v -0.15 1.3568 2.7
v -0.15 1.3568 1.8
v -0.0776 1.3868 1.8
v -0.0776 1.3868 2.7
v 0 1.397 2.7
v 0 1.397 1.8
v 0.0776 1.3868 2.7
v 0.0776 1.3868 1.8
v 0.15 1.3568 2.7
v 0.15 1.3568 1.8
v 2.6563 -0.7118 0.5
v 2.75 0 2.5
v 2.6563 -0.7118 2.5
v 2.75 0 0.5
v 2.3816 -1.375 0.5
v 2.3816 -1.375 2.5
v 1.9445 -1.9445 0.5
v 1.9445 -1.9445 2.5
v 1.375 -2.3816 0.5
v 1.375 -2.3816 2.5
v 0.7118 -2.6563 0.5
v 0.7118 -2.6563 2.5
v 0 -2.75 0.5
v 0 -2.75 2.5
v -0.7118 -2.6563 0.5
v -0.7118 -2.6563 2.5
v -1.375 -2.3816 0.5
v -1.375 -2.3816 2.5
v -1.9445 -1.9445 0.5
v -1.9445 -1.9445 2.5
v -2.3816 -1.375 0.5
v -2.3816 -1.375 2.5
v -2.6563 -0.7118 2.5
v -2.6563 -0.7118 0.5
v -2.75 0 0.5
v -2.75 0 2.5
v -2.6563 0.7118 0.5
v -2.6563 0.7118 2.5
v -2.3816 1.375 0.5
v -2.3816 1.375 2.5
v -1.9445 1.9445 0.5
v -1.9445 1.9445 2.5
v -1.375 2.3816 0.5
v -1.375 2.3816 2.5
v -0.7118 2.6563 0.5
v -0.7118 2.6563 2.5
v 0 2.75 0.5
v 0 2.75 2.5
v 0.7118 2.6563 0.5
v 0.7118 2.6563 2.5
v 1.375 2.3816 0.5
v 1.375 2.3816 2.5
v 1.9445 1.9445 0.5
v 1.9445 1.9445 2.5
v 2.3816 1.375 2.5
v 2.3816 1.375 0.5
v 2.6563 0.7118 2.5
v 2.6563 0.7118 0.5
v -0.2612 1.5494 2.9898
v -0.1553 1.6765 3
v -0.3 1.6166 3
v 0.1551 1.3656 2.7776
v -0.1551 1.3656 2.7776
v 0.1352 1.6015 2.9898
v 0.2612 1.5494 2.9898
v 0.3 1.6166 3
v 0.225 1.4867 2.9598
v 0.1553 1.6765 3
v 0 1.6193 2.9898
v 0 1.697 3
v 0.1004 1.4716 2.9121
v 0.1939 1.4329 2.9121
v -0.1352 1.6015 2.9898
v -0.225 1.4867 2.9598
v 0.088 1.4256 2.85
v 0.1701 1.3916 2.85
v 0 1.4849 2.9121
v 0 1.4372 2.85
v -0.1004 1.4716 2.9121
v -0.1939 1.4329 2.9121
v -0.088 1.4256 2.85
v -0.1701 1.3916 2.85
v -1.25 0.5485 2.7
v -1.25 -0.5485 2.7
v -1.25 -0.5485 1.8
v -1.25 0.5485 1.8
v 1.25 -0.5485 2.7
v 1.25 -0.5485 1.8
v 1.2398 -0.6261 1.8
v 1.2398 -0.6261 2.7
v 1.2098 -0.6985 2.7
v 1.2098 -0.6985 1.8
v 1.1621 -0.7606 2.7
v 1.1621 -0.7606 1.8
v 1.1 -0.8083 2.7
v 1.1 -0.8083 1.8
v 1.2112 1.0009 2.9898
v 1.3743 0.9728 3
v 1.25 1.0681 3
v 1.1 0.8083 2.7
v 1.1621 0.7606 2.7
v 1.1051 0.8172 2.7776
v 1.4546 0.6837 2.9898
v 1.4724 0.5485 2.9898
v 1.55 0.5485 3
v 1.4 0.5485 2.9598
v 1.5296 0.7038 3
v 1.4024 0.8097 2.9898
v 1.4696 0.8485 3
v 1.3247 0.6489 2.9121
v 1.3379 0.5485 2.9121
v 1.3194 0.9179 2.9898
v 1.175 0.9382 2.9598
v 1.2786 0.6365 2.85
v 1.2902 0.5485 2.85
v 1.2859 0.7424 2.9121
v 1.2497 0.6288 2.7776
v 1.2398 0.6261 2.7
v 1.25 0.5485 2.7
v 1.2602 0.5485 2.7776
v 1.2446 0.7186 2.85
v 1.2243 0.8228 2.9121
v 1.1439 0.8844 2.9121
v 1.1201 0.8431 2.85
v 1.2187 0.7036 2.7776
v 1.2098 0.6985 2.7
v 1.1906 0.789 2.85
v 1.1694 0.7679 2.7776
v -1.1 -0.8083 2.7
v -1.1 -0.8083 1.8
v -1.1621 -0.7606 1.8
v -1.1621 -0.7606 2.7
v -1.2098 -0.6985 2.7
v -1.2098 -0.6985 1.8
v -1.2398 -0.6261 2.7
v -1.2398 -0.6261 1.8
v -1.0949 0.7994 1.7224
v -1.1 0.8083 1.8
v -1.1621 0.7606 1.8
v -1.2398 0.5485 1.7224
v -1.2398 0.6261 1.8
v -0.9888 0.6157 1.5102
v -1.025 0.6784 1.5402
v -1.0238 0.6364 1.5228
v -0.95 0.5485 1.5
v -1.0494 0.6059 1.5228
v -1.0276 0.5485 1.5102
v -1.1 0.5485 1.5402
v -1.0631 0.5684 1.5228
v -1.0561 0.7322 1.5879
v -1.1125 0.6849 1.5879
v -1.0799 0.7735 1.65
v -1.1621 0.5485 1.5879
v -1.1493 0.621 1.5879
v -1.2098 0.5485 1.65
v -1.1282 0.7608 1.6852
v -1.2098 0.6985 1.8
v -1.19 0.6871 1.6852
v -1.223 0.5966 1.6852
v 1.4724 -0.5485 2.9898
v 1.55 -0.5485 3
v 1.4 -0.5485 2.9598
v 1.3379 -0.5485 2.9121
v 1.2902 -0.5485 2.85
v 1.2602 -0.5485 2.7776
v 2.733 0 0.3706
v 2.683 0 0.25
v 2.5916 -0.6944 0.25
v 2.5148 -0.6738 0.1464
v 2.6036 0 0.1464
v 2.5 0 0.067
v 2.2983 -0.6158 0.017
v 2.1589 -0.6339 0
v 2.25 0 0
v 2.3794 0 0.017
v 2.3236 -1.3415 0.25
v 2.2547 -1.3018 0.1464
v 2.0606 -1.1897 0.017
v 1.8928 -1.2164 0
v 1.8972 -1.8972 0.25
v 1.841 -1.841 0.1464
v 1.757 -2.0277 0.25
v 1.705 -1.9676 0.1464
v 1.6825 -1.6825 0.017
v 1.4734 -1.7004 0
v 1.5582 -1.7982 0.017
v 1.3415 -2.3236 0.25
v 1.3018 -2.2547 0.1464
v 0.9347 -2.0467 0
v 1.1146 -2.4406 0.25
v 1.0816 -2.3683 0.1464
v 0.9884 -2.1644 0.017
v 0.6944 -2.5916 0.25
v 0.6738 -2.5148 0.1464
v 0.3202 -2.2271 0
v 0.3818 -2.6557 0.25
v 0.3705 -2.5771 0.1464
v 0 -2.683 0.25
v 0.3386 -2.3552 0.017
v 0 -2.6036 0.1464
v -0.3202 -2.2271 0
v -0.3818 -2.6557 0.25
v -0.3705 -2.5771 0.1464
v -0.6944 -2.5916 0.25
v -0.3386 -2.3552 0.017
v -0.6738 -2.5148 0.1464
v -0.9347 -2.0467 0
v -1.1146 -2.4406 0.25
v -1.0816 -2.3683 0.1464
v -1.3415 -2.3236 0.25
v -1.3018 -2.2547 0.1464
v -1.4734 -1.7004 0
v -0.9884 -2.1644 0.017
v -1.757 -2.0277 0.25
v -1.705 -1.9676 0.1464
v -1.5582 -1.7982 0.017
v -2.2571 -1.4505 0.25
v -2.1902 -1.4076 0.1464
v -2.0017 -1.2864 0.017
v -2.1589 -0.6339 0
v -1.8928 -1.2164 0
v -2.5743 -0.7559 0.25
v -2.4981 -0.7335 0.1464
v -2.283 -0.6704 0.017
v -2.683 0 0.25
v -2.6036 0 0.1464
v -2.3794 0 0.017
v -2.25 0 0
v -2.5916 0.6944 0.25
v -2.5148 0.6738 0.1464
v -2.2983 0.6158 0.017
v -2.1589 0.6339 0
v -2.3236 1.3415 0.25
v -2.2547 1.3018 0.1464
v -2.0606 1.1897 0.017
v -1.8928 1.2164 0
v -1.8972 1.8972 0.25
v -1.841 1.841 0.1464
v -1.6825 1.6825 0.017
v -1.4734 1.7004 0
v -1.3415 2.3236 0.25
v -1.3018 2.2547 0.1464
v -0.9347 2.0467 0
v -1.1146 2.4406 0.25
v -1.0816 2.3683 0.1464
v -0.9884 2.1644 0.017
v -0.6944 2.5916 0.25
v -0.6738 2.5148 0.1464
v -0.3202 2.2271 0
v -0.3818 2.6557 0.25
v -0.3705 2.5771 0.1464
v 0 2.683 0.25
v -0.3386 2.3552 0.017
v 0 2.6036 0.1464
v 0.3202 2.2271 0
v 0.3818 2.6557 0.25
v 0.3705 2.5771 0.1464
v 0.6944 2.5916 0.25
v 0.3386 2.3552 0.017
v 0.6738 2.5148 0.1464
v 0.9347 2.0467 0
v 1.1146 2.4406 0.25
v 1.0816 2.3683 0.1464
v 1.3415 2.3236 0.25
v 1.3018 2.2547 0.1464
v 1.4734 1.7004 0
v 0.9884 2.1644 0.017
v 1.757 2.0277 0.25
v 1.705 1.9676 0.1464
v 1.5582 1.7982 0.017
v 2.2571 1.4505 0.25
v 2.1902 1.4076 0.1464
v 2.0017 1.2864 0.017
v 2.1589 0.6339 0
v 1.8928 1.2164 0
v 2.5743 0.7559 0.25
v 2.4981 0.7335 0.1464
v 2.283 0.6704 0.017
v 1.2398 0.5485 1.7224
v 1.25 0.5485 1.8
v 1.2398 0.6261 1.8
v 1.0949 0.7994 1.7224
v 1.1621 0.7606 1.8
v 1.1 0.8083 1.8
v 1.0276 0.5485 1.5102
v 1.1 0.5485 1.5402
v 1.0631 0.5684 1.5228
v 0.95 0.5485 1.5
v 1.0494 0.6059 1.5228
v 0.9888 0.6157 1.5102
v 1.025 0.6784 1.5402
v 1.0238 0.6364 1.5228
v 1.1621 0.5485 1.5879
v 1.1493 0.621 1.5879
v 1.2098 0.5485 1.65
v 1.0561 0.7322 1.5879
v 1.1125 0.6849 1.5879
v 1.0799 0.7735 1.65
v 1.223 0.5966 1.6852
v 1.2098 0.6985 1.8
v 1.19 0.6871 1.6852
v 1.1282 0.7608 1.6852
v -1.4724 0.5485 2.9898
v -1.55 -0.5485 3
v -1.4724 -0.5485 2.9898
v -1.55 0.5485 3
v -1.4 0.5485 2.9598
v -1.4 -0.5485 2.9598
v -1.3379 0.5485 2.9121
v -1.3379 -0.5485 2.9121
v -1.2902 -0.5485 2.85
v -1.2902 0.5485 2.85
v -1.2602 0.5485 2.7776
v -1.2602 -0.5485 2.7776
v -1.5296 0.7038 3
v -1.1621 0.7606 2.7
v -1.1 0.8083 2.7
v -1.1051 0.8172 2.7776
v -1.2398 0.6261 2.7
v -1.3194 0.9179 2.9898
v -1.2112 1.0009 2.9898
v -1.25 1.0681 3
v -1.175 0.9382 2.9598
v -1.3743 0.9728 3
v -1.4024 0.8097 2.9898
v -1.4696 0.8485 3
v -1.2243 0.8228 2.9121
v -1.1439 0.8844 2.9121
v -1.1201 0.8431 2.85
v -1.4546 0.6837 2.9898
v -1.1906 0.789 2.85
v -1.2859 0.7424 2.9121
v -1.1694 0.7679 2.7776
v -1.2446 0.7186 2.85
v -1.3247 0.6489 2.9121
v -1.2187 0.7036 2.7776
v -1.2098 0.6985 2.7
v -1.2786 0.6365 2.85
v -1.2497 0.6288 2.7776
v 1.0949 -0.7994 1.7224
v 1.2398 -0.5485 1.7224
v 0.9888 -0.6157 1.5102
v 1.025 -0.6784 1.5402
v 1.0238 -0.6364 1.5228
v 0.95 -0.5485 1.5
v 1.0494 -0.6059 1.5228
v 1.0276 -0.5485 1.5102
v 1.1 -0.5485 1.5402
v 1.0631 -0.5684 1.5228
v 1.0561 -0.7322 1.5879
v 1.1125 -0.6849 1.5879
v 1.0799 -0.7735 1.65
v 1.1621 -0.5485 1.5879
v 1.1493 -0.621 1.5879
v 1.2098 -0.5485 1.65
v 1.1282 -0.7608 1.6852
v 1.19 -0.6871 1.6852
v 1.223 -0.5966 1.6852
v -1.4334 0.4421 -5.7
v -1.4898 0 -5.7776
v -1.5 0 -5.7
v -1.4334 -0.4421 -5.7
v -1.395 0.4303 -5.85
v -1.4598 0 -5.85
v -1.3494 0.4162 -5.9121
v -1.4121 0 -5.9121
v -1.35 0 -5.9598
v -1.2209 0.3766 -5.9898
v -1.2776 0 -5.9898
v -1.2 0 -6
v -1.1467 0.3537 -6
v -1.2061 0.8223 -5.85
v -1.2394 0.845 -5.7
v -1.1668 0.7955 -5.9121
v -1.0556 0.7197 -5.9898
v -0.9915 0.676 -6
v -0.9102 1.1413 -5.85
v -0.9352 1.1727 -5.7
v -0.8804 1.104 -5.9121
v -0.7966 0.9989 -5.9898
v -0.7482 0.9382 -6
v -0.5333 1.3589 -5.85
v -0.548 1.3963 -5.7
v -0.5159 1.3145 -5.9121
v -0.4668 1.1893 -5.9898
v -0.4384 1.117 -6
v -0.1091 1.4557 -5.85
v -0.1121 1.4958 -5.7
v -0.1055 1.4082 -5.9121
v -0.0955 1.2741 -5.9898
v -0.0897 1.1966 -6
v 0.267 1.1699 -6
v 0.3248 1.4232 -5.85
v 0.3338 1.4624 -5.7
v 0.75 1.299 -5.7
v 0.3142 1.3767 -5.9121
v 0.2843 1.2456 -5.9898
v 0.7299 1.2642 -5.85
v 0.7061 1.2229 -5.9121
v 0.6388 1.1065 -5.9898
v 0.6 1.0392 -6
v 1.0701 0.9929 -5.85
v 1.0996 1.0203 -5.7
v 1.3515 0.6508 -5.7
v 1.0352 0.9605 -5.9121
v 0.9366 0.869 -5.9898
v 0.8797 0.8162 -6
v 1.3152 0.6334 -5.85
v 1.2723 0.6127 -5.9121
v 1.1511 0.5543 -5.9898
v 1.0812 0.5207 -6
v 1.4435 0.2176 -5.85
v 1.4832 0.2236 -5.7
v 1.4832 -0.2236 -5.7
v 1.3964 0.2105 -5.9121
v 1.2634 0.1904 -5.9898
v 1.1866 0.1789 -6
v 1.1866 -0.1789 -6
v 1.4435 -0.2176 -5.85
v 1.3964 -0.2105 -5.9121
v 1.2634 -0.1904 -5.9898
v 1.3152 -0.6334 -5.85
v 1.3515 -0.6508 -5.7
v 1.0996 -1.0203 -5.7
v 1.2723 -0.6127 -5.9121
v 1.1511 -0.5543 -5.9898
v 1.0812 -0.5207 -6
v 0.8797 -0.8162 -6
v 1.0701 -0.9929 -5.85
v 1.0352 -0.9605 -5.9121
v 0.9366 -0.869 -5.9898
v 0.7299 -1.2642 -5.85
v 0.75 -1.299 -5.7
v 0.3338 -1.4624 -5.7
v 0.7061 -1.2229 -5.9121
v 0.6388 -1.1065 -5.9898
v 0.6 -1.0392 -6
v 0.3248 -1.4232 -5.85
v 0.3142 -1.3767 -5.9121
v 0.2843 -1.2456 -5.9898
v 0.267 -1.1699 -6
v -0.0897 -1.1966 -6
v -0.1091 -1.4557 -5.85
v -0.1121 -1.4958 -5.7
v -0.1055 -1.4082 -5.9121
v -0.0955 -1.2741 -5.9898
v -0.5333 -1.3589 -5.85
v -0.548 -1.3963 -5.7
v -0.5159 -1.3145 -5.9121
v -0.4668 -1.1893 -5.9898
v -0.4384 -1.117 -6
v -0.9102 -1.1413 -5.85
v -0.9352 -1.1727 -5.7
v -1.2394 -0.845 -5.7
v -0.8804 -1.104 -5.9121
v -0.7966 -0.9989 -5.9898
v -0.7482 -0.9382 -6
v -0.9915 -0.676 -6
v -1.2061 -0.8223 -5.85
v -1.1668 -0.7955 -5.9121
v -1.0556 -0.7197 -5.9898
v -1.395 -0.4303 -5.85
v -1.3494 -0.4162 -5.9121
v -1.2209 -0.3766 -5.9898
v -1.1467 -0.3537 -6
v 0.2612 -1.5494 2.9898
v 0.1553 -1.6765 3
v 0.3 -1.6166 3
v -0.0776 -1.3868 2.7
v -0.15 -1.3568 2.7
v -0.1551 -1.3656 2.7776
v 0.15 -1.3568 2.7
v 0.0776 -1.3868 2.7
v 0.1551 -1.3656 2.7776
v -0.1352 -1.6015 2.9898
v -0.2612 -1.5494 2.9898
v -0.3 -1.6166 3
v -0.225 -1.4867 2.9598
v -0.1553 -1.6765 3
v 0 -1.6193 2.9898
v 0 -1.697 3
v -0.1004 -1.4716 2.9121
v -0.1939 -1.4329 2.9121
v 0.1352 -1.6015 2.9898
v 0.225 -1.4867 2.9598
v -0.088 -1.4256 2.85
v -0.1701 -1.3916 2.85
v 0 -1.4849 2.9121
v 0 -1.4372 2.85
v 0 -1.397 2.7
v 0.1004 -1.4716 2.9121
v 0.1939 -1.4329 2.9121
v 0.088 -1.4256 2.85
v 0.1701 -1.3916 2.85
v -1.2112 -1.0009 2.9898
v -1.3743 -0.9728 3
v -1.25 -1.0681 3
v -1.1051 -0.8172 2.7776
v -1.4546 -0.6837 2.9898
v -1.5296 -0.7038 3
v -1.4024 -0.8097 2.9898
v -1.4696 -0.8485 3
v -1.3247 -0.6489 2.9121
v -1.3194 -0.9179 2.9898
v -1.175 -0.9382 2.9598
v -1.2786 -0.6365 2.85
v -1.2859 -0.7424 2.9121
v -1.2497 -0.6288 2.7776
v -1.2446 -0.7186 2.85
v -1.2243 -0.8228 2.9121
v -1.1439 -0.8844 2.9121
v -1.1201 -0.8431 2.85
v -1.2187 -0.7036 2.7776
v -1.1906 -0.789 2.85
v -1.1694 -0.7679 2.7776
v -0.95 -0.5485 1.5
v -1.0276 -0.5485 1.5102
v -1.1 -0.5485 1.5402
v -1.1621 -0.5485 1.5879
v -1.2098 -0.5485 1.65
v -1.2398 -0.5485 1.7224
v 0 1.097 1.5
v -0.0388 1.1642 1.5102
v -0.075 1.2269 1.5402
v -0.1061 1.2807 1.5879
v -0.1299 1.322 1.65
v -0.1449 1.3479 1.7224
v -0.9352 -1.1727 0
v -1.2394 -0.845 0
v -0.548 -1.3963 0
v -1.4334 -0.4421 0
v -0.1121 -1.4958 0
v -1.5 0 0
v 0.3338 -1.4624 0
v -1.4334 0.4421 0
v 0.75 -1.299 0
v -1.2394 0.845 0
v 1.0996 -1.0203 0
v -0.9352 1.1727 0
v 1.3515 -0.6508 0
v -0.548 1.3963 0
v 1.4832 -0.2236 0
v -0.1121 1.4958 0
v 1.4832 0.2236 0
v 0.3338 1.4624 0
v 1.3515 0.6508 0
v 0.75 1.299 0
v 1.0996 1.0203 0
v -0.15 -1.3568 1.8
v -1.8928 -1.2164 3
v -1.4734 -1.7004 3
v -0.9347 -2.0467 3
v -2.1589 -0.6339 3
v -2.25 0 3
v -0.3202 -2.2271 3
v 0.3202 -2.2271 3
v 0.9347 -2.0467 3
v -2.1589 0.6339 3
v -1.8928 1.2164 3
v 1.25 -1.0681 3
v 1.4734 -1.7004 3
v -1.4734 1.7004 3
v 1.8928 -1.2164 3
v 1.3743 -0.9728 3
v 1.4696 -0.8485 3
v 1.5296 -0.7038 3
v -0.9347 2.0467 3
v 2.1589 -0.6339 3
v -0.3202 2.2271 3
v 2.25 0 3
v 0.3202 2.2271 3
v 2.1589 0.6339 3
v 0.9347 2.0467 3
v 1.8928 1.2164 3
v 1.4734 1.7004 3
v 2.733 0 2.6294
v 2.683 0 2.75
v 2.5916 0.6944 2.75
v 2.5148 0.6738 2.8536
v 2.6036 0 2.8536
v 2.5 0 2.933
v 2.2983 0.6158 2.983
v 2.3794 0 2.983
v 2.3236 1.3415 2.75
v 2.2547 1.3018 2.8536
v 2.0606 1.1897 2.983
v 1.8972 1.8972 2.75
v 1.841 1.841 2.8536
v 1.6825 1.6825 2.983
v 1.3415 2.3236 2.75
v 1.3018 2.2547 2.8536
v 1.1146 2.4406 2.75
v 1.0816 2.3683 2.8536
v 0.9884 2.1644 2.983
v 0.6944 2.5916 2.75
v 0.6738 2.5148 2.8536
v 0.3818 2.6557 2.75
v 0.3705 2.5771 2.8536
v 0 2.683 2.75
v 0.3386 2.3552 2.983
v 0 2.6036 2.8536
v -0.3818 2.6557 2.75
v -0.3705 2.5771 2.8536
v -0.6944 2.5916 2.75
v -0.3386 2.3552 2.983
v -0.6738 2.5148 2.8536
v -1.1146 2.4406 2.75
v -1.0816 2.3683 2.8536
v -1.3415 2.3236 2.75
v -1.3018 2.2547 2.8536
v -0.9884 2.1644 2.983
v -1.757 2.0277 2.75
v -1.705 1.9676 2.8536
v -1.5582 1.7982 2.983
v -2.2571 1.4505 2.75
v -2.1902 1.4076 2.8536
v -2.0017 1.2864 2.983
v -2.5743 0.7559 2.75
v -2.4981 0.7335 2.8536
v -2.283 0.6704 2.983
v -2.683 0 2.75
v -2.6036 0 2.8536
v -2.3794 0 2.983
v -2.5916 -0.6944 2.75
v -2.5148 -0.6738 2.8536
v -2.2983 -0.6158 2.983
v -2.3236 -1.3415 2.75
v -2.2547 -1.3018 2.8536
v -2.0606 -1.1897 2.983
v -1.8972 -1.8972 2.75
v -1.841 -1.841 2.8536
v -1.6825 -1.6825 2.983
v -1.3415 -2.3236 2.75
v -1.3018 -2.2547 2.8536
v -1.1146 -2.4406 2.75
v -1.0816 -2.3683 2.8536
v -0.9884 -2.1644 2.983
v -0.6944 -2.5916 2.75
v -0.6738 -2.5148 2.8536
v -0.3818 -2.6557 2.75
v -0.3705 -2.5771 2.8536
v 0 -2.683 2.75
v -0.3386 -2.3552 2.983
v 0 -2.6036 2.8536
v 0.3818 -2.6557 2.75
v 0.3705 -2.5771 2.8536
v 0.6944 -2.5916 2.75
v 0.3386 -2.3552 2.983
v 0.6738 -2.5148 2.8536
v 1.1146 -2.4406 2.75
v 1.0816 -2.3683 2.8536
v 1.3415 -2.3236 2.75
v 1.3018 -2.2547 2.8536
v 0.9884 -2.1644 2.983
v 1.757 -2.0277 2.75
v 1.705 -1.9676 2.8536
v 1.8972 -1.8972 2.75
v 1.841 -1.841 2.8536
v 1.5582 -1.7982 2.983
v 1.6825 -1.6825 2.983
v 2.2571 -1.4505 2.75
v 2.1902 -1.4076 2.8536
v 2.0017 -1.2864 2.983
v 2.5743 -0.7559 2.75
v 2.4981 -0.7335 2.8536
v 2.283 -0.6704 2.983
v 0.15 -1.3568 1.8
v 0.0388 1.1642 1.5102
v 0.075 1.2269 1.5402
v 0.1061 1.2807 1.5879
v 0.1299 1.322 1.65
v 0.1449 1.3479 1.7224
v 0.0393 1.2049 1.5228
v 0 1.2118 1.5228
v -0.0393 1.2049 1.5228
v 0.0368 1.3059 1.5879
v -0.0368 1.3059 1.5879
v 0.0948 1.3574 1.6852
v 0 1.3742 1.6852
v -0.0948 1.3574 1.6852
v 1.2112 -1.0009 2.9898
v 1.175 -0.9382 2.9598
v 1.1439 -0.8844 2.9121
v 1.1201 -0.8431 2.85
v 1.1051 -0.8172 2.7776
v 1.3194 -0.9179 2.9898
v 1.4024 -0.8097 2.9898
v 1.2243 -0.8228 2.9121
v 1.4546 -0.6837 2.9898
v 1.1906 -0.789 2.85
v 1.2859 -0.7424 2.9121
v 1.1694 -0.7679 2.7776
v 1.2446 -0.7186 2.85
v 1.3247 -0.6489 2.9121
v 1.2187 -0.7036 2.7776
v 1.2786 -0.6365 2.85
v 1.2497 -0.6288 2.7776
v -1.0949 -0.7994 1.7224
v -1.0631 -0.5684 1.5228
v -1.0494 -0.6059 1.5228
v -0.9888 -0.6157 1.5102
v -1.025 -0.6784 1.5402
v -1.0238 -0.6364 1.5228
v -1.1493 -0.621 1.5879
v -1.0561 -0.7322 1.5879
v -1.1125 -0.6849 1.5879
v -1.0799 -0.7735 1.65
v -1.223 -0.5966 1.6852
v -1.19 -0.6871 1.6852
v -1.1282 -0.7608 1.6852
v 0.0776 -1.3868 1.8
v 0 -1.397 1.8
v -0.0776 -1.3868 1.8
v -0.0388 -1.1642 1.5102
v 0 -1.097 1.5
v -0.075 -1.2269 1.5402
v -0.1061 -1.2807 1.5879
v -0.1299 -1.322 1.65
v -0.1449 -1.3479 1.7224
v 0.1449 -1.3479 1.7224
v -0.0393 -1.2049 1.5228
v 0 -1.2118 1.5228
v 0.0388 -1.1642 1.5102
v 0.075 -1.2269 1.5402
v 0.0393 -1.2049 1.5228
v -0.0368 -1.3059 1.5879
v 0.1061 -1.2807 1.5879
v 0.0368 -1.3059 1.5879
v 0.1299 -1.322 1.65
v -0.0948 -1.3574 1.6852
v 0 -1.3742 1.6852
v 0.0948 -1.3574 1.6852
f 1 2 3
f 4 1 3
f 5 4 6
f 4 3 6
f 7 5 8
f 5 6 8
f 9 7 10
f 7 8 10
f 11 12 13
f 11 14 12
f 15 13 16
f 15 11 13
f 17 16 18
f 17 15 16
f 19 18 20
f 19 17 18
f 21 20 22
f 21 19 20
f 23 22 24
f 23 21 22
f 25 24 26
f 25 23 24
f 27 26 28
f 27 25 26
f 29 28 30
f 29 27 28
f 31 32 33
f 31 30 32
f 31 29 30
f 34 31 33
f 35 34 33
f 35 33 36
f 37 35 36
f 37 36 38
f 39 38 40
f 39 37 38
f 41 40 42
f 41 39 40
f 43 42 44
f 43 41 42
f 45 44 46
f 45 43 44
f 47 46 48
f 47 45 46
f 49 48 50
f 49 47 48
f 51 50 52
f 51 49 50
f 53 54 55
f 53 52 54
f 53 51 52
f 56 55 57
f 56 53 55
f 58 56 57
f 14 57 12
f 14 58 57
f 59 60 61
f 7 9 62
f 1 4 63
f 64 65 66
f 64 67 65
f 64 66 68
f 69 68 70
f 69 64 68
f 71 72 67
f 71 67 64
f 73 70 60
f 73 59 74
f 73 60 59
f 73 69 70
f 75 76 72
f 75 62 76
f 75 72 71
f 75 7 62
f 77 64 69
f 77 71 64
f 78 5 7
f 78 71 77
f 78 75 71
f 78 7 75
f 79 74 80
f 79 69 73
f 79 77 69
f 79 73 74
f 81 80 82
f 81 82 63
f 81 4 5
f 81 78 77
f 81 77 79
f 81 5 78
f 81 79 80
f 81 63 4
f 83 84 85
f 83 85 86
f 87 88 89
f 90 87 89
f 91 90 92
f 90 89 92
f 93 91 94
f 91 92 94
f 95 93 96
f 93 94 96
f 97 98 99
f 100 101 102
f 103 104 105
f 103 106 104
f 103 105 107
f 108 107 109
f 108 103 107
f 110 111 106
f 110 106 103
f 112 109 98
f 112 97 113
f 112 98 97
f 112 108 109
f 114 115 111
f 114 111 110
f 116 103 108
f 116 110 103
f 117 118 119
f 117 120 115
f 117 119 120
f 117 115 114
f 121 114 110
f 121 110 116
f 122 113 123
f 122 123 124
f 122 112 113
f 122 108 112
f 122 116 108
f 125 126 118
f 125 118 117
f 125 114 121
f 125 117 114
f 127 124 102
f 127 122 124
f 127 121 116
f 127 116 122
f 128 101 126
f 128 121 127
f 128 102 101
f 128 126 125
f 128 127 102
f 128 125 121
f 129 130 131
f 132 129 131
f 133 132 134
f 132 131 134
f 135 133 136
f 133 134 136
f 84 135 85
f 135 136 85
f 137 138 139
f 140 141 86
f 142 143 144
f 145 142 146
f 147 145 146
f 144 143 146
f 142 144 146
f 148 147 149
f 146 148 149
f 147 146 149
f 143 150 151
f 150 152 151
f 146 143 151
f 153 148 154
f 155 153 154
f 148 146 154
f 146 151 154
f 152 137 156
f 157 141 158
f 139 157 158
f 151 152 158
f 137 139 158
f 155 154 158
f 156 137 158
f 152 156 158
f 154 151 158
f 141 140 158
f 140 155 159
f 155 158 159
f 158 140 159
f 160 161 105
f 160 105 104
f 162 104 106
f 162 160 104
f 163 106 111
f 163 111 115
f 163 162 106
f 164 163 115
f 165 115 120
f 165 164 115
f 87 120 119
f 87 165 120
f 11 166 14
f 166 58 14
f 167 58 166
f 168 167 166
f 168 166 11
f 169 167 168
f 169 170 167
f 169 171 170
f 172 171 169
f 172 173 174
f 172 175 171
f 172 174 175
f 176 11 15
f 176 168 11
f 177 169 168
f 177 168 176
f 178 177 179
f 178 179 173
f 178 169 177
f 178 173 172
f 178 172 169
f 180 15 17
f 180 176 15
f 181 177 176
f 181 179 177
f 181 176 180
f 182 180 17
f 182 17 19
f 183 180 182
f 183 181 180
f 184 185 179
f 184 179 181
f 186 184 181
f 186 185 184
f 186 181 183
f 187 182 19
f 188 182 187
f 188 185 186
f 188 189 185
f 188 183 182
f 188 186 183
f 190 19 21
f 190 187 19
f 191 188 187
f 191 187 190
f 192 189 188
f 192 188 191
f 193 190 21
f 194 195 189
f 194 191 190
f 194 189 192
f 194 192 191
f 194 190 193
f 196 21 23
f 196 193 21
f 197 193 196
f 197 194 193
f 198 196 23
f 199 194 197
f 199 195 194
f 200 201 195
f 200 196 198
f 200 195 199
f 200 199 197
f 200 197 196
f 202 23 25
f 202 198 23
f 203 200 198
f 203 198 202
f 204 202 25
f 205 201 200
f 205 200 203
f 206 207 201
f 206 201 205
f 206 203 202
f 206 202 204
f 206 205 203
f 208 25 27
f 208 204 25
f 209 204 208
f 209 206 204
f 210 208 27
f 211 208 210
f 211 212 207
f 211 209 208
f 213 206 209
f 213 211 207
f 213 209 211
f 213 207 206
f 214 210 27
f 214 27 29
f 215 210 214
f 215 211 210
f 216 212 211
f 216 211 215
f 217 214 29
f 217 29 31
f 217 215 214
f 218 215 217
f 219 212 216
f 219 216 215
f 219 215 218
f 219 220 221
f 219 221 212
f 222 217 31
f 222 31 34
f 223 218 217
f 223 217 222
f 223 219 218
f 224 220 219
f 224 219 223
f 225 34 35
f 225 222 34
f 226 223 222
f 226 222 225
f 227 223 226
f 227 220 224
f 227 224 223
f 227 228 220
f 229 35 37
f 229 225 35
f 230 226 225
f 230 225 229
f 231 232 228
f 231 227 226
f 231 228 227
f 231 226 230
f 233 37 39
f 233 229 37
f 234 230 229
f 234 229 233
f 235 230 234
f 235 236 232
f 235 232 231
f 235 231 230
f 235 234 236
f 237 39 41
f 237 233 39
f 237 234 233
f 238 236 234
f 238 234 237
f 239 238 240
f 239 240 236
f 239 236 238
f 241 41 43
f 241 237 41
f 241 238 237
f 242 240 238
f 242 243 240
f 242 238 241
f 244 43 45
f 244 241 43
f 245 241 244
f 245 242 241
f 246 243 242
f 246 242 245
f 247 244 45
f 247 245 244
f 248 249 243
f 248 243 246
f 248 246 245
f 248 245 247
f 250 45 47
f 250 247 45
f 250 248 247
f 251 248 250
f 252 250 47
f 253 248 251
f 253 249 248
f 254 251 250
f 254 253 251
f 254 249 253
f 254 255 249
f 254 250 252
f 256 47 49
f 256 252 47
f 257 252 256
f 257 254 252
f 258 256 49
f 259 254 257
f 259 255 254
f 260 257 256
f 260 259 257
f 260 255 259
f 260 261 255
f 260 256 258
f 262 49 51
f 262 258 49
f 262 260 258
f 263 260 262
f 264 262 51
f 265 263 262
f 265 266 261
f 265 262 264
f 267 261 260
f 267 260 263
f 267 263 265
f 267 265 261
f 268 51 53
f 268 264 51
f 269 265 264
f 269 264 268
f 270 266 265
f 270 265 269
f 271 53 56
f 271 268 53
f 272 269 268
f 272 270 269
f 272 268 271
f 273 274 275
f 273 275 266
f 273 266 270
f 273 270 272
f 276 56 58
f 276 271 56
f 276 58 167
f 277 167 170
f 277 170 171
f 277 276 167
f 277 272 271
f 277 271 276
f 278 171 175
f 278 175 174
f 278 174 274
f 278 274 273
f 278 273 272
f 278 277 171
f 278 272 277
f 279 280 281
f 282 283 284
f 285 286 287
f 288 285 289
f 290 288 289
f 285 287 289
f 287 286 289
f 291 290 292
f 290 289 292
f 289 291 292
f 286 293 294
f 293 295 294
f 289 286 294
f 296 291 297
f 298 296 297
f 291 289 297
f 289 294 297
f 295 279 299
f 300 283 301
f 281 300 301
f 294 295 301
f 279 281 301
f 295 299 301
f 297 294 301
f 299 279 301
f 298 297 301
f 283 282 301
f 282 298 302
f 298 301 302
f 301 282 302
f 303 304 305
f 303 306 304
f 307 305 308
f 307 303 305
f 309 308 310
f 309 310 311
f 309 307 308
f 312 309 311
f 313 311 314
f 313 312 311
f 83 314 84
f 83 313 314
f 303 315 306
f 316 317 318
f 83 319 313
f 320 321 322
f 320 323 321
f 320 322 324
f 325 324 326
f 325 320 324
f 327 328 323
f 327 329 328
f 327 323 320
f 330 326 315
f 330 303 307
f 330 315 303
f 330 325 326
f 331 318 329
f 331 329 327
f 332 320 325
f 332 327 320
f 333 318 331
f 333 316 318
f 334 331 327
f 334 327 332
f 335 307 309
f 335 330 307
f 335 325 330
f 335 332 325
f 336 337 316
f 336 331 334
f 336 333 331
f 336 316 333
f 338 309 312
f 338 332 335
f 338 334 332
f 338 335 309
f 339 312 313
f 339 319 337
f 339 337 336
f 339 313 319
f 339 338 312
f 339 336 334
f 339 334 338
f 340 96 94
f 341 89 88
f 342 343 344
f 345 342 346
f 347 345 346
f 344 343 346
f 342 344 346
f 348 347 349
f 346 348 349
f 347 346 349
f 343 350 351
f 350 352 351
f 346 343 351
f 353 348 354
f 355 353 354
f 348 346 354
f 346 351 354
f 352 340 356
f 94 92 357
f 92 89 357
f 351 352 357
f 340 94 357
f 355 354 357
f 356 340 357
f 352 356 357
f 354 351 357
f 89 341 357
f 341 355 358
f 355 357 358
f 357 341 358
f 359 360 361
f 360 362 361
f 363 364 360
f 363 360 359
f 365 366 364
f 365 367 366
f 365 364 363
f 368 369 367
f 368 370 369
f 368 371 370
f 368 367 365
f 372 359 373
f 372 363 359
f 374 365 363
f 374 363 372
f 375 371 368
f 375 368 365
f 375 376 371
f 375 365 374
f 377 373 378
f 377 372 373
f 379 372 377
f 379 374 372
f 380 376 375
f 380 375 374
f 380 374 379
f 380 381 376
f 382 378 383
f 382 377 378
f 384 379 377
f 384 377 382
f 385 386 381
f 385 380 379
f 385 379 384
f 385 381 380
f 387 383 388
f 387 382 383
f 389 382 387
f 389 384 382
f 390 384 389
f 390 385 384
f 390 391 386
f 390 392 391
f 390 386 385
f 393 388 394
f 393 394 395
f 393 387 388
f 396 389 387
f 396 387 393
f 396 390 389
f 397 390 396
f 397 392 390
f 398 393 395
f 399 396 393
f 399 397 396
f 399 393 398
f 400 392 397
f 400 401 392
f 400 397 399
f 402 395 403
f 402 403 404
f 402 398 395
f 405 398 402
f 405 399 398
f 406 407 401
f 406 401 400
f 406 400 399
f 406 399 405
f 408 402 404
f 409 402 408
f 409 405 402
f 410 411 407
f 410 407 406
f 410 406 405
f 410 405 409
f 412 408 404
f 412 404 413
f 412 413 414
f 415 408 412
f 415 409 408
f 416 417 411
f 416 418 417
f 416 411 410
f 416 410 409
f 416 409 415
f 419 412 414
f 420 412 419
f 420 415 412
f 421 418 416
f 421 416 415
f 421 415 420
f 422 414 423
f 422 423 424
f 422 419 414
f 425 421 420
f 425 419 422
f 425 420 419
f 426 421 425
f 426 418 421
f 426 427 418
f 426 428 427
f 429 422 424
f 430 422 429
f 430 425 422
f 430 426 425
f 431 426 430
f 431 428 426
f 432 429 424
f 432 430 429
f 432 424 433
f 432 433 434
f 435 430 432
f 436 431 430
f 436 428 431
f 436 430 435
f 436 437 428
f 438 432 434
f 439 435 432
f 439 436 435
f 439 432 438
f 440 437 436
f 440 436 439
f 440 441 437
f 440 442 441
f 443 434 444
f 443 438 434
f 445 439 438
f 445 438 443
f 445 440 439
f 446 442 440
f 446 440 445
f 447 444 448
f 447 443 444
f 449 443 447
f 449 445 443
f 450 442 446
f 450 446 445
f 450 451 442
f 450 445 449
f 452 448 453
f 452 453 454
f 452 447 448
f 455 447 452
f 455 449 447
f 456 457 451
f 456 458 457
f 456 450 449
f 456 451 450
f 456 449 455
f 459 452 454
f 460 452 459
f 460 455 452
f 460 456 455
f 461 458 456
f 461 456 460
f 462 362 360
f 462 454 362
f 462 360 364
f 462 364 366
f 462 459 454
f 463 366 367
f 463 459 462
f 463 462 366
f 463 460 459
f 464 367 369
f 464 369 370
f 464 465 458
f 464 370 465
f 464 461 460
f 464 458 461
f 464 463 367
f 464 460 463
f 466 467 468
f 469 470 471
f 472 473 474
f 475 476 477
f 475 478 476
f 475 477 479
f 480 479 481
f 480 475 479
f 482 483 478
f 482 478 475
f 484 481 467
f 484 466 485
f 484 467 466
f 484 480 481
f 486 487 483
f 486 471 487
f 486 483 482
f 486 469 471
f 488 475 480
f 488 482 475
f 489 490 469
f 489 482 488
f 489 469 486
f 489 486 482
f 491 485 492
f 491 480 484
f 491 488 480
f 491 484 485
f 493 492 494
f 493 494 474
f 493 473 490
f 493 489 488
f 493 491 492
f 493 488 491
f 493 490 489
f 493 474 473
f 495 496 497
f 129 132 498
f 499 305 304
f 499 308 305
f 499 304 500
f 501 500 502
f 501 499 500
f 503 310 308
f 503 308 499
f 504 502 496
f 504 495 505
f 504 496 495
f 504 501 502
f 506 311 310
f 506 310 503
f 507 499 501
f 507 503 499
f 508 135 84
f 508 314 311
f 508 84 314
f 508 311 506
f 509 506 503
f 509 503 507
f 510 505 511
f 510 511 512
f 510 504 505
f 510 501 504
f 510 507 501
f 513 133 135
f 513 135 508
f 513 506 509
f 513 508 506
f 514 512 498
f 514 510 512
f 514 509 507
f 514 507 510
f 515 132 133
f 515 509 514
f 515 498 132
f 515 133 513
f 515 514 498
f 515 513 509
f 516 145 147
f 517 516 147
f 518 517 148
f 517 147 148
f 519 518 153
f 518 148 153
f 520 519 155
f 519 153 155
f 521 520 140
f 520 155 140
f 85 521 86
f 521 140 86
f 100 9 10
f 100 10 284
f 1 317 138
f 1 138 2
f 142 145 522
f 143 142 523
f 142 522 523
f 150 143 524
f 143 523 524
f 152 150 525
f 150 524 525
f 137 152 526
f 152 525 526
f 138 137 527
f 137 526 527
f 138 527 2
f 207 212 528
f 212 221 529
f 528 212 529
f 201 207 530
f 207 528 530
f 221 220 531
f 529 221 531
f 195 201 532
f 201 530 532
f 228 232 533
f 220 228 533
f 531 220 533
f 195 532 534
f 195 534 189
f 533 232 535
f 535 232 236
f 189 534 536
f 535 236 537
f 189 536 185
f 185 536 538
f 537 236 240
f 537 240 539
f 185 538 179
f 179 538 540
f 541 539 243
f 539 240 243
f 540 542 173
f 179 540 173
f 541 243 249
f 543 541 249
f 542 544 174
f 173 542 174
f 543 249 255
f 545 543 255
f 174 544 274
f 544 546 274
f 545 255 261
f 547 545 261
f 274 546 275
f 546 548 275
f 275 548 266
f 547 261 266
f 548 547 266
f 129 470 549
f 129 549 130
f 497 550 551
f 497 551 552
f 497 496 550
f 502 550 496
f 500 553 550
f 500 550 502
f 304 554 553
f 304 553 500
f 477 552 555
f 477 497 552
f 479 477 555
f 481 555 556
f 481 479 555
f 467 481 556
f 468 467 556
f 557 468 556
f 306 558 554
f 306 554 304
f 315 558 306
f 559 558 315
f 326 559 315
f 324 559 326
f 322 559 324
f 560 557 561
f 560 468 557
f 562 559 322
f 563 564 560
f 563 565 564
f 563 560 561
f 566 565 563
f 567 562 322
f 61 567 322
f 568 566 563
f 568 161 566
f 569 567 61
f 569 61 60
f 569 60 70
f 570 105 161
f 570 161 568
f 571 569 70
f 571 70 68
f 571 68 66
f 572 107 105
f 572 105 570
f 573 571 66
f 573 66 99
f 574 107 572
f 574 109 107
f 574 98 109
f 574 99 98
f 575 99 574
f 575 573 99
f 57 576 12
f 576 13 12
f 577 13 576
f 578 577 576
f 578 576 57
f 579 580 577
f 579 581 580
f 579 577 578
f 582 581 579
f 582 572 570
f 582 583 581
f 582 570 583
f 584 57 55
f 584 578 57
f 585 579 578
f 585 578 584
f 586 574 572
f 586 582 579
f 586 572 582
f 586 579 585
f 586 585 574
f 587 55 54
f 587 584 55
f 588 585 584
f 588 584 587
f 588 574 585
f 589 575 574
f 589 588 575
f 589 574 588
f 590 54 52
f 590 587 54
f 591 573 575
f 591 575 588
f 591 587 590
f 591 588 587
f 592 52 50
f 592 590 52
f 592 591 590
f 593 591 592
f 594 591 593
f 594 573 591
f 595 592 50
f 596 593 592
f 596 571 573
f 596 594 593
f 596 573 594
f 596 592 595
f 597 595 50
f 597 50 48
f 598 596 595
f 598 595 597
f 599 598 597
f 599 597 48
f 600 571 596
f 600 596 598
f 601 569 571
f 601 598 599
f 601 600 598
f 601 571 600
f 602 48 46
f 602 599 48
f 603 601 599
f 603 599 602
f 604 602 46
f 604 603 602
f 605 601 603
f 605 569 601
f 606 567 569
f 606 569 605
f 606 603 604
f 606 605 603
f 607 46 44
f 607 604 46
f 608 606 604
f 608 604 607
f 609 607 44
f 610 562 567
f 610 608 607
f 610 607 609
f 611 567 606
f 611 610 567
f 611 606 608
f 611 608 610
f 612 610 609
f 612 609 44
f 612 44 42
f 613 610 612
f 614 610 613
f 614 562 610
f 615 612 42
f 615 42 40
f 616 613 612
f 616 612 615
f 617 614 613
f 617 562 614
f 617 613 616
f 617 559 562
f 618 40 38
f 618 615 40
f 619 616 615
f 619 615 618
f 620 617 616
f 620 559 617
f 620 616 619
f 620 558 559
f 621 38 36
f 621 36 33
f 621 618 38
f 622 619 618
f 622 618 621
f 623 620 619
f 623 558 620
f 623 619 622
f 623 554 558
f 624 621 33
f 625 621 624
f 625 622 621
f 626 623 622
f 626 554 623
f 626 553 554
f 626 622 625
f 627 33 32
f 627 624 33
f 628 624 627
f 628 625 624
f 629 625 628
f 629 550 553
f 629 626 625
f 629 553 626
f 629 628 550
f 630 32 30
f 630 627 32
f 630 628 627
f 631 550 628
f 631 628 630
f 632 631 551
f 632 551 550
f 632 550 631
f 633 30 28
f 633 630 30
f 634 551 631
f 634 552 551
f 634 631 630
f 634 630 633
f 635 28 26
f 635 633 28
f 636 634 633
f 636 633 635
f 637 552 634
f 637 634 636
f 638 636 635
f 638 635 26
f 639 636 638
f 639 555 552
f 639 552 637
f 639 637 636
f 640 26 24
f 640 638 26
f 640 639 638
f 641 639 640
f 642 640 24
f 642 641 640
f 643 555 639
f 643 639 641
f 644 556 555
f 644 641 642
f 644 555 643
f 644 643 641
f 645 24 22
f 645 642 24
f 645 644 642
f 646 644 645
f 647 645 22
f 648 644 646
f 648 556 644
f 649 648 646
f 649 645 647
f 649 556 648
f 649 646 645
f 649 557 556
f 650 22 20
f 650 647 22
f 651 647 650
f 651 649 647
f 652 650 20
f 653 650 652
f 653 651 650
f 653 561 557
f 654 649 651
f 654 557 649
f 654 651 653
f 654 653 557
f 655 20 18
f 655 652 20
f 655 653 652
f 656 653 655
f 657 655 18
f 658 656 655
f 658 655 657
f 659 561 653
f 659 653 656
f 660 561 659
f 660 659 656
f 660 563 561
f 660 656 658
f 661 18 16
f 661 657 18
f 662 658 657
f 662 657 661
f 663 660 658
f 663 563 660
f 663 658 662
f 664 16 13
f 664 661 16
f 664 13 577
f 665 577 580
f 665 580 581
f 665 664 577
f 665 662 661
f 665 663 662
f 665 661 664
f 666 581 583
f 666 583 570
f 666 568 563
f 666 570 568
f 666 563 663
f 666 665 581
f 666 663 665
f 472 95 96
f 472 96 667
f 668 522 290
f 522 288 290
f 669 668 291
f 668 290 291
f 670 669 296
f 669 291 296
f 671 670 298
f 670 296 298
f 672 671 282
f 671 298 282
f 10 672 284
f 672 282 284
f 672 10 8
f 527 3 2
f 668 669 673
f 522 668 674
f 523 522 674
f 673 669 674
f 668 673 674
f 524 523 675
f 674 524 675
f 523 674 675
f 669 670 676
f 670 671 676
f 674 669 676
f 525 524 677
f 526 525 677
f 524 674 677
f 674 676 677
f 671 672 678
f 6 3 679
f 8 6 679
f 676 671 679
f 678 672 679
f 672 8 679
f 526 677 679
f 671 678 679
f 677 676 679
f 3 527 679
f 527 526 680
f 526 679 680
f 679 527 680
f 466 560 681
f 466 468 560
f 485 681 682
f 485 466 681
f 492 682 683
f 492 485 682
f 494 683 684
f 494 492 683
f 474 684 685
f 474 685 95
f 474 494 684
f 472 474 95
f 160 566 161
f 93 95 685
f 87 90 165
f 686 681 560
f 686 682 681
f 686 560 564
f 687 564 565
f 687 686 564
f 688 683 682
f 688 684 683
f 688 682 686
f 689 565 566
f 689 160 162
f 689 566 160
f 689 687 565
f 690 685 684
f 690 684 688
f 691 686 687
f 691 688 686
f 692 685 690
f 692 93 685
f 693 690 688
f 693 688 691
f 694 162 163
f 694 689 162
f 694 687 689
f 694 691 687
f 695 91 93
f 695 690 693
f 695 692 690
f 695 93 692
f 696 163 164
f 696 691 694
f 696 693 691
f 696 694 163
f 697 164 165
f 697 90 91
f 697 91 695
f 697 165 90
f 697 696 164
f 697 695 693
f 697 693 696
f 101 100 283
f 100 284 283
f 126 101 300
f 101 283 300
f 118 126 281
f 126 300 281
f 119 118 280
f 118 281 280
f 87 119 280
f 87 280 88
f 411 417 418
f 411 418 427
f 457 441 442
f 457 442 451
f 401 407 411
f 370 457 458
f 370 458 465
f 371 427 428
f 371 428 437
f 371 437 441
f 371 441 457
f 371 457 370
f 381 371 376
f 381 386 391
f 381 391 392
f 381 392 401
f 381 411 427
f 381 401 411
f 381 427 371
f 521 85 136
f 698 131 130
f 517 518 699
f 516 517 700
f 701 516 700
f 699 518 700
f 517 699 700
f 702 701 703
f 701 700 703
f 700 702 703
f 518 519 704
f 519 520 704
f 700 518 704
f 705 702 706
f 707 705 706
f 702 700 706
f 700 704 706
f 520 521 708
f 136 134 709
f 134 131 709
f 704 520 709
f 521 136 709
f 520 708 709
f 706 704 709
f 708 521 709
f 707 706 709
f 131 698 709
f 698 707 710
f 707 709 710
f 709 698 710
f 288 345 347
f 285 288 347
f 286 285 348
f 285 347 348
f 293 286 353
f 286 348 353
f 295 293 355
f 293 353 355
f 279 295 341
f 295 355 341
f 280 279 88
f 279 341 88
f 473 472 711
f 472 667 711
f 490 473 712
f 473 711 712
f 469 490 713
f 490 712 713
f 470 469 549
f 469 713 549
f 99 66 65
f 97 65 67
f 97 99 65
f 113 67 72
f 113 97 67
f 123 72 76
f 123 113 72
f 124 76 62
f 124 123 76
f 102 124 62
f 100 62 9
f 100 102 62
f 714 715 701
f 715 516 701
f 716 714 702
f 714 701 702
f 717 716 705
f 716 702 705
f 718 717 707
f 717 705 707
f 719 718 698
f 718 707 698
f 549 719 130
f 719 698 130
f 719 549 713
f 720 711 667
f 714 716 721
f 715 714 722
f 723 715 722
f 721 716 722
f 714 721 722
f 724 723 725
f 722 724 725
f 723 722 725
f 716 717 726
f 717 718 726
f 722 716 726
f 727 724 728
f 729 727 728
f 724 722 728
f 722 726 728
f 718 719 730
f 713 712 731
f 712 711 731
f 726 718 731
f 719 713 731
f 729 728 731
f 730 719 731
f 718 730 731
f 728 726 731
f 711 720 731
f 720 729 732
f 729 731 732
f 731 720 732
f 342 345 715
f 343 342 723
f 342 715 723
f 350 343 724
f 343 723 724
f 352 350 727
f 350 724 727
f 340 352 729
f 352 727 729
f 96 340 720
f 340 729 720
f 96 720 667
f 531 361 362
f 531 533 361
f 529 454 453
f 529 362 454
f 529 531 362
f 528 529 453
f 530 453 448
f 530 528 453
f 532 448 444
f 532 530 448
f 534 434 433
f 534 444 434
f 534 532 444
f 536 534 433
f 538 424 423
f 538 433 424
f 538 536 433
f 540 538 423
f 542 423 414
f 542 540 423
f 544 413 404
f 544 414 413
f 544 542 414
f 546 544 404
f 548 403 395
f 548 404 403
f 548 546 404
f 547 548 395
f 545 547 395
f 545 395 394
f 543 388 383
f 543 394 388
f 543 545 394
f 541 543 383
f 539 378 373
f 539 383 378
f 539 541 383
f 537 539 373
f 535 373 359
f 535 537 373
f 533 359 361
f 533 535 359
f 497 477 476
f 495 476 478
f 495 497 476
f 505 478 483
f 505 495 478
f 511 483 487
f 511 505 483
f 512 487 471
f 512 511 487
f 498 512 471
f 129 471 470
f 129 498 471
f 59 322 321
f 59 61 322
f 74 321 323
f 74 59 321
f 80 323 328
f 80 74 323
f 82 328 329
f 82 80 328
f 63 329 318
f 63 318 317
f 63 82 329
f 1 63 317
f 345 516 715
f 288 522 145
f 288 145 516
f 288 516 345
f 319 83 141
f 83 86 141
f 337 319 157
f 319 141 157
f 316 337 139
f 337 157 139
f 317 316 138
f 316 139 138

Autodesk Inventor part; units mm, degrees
ref_plane "YZ Plane" through (0, 0, 0) normal (1, 0, 0) x (0, 1, 0)
ref_plane "XZ Plane" through (0, 0, 0) normal (0, 1, 0) x (-1, 0, 0)
ref_plane "XY Plane" through (0, 0, 0) normal (0, 0, 1) x (1, 0, 0)
sketch "スケッチ1" plane through (0, 0, 0) normal (0, 0, 1) x (1, 0, 0)
  circle A0 centre (0, 0) radius 2.75
  dimension "d0" = 5.5
extrude "押し出し1" add sketch "スケッチ1" along normal blind 3
sketch "スケッチ2" plane through (0, 0, 0) normal (0, 0, -1) x (-1, 0, 0)
  circle A0 centre (0, 0) radius 2.75 projected
  circle A1 centre (0, 0) radius 1.5
  dimension "d3" = 3
extrude "押し出し2" add sketch "スケッチ2" along normal blind 6 contours A1
sketch "スケッチ3" plane through (0, 0, 3) normal (0, 0, 1) x (1, 0, 0)
  circle A0 centre (0, 0) radius 2.75 projected
  line L0 (0, 1.4434) -> (1.25, 0.7217)
  line L1 (1.25, 0.7217) -> (1.25, -0.7217)
  line L2 (1.25, -0.7217) -> (0, -1.4434)
  line L3 (0, -1.4434) -> (-1.25, -0.7217)
  line L4 (-1.25, -0.7217) -> (-1.25, 0.7217)
  line L5 (-1.25, 0.7217) -> (0, 1.4434)
  dimension "d6" = 1.25
extrude "押し出し3" cut sketch "スケッチ3" against normal blind 1.5 contours L0 L1 L2 L3 L4 L5
fillet "フィレット1" radius 0.5 2 edges at (-2.75, 0, 3) (-2.75, 0, 0)
fillet "フィレット2" radius 0.3 19 edges at (-0.625, 1.0825, 3) (-1.25, 0, 3) (-0.625, -1.0825, 3) (0.625, -1.0825, 3) (1.25, 0, 3) (0.625, 1.0825, 3) (-0.625, 1.0825, 1.5) (0.625, 1.0825, 1.5) (0, 1.4434, 2.25) (-1.25, 0.7217, 2.25) (-0.625, -1.0825, 1.5) (-1.25, -0.7217, 2.25) (-1.25, 0, 1.5) (1.25, 0, 1.5) (1.25, 0.7217, 2.25) (1.25, -0.7217, 2.25) (0.625, -1.0825, 1.5) (0, -1.4434, 2.25) (1.5, 0, -6)
thread "ねじ2" size "M3x0.5" class "6g" standard "ANSI Metric M Profile" full length
